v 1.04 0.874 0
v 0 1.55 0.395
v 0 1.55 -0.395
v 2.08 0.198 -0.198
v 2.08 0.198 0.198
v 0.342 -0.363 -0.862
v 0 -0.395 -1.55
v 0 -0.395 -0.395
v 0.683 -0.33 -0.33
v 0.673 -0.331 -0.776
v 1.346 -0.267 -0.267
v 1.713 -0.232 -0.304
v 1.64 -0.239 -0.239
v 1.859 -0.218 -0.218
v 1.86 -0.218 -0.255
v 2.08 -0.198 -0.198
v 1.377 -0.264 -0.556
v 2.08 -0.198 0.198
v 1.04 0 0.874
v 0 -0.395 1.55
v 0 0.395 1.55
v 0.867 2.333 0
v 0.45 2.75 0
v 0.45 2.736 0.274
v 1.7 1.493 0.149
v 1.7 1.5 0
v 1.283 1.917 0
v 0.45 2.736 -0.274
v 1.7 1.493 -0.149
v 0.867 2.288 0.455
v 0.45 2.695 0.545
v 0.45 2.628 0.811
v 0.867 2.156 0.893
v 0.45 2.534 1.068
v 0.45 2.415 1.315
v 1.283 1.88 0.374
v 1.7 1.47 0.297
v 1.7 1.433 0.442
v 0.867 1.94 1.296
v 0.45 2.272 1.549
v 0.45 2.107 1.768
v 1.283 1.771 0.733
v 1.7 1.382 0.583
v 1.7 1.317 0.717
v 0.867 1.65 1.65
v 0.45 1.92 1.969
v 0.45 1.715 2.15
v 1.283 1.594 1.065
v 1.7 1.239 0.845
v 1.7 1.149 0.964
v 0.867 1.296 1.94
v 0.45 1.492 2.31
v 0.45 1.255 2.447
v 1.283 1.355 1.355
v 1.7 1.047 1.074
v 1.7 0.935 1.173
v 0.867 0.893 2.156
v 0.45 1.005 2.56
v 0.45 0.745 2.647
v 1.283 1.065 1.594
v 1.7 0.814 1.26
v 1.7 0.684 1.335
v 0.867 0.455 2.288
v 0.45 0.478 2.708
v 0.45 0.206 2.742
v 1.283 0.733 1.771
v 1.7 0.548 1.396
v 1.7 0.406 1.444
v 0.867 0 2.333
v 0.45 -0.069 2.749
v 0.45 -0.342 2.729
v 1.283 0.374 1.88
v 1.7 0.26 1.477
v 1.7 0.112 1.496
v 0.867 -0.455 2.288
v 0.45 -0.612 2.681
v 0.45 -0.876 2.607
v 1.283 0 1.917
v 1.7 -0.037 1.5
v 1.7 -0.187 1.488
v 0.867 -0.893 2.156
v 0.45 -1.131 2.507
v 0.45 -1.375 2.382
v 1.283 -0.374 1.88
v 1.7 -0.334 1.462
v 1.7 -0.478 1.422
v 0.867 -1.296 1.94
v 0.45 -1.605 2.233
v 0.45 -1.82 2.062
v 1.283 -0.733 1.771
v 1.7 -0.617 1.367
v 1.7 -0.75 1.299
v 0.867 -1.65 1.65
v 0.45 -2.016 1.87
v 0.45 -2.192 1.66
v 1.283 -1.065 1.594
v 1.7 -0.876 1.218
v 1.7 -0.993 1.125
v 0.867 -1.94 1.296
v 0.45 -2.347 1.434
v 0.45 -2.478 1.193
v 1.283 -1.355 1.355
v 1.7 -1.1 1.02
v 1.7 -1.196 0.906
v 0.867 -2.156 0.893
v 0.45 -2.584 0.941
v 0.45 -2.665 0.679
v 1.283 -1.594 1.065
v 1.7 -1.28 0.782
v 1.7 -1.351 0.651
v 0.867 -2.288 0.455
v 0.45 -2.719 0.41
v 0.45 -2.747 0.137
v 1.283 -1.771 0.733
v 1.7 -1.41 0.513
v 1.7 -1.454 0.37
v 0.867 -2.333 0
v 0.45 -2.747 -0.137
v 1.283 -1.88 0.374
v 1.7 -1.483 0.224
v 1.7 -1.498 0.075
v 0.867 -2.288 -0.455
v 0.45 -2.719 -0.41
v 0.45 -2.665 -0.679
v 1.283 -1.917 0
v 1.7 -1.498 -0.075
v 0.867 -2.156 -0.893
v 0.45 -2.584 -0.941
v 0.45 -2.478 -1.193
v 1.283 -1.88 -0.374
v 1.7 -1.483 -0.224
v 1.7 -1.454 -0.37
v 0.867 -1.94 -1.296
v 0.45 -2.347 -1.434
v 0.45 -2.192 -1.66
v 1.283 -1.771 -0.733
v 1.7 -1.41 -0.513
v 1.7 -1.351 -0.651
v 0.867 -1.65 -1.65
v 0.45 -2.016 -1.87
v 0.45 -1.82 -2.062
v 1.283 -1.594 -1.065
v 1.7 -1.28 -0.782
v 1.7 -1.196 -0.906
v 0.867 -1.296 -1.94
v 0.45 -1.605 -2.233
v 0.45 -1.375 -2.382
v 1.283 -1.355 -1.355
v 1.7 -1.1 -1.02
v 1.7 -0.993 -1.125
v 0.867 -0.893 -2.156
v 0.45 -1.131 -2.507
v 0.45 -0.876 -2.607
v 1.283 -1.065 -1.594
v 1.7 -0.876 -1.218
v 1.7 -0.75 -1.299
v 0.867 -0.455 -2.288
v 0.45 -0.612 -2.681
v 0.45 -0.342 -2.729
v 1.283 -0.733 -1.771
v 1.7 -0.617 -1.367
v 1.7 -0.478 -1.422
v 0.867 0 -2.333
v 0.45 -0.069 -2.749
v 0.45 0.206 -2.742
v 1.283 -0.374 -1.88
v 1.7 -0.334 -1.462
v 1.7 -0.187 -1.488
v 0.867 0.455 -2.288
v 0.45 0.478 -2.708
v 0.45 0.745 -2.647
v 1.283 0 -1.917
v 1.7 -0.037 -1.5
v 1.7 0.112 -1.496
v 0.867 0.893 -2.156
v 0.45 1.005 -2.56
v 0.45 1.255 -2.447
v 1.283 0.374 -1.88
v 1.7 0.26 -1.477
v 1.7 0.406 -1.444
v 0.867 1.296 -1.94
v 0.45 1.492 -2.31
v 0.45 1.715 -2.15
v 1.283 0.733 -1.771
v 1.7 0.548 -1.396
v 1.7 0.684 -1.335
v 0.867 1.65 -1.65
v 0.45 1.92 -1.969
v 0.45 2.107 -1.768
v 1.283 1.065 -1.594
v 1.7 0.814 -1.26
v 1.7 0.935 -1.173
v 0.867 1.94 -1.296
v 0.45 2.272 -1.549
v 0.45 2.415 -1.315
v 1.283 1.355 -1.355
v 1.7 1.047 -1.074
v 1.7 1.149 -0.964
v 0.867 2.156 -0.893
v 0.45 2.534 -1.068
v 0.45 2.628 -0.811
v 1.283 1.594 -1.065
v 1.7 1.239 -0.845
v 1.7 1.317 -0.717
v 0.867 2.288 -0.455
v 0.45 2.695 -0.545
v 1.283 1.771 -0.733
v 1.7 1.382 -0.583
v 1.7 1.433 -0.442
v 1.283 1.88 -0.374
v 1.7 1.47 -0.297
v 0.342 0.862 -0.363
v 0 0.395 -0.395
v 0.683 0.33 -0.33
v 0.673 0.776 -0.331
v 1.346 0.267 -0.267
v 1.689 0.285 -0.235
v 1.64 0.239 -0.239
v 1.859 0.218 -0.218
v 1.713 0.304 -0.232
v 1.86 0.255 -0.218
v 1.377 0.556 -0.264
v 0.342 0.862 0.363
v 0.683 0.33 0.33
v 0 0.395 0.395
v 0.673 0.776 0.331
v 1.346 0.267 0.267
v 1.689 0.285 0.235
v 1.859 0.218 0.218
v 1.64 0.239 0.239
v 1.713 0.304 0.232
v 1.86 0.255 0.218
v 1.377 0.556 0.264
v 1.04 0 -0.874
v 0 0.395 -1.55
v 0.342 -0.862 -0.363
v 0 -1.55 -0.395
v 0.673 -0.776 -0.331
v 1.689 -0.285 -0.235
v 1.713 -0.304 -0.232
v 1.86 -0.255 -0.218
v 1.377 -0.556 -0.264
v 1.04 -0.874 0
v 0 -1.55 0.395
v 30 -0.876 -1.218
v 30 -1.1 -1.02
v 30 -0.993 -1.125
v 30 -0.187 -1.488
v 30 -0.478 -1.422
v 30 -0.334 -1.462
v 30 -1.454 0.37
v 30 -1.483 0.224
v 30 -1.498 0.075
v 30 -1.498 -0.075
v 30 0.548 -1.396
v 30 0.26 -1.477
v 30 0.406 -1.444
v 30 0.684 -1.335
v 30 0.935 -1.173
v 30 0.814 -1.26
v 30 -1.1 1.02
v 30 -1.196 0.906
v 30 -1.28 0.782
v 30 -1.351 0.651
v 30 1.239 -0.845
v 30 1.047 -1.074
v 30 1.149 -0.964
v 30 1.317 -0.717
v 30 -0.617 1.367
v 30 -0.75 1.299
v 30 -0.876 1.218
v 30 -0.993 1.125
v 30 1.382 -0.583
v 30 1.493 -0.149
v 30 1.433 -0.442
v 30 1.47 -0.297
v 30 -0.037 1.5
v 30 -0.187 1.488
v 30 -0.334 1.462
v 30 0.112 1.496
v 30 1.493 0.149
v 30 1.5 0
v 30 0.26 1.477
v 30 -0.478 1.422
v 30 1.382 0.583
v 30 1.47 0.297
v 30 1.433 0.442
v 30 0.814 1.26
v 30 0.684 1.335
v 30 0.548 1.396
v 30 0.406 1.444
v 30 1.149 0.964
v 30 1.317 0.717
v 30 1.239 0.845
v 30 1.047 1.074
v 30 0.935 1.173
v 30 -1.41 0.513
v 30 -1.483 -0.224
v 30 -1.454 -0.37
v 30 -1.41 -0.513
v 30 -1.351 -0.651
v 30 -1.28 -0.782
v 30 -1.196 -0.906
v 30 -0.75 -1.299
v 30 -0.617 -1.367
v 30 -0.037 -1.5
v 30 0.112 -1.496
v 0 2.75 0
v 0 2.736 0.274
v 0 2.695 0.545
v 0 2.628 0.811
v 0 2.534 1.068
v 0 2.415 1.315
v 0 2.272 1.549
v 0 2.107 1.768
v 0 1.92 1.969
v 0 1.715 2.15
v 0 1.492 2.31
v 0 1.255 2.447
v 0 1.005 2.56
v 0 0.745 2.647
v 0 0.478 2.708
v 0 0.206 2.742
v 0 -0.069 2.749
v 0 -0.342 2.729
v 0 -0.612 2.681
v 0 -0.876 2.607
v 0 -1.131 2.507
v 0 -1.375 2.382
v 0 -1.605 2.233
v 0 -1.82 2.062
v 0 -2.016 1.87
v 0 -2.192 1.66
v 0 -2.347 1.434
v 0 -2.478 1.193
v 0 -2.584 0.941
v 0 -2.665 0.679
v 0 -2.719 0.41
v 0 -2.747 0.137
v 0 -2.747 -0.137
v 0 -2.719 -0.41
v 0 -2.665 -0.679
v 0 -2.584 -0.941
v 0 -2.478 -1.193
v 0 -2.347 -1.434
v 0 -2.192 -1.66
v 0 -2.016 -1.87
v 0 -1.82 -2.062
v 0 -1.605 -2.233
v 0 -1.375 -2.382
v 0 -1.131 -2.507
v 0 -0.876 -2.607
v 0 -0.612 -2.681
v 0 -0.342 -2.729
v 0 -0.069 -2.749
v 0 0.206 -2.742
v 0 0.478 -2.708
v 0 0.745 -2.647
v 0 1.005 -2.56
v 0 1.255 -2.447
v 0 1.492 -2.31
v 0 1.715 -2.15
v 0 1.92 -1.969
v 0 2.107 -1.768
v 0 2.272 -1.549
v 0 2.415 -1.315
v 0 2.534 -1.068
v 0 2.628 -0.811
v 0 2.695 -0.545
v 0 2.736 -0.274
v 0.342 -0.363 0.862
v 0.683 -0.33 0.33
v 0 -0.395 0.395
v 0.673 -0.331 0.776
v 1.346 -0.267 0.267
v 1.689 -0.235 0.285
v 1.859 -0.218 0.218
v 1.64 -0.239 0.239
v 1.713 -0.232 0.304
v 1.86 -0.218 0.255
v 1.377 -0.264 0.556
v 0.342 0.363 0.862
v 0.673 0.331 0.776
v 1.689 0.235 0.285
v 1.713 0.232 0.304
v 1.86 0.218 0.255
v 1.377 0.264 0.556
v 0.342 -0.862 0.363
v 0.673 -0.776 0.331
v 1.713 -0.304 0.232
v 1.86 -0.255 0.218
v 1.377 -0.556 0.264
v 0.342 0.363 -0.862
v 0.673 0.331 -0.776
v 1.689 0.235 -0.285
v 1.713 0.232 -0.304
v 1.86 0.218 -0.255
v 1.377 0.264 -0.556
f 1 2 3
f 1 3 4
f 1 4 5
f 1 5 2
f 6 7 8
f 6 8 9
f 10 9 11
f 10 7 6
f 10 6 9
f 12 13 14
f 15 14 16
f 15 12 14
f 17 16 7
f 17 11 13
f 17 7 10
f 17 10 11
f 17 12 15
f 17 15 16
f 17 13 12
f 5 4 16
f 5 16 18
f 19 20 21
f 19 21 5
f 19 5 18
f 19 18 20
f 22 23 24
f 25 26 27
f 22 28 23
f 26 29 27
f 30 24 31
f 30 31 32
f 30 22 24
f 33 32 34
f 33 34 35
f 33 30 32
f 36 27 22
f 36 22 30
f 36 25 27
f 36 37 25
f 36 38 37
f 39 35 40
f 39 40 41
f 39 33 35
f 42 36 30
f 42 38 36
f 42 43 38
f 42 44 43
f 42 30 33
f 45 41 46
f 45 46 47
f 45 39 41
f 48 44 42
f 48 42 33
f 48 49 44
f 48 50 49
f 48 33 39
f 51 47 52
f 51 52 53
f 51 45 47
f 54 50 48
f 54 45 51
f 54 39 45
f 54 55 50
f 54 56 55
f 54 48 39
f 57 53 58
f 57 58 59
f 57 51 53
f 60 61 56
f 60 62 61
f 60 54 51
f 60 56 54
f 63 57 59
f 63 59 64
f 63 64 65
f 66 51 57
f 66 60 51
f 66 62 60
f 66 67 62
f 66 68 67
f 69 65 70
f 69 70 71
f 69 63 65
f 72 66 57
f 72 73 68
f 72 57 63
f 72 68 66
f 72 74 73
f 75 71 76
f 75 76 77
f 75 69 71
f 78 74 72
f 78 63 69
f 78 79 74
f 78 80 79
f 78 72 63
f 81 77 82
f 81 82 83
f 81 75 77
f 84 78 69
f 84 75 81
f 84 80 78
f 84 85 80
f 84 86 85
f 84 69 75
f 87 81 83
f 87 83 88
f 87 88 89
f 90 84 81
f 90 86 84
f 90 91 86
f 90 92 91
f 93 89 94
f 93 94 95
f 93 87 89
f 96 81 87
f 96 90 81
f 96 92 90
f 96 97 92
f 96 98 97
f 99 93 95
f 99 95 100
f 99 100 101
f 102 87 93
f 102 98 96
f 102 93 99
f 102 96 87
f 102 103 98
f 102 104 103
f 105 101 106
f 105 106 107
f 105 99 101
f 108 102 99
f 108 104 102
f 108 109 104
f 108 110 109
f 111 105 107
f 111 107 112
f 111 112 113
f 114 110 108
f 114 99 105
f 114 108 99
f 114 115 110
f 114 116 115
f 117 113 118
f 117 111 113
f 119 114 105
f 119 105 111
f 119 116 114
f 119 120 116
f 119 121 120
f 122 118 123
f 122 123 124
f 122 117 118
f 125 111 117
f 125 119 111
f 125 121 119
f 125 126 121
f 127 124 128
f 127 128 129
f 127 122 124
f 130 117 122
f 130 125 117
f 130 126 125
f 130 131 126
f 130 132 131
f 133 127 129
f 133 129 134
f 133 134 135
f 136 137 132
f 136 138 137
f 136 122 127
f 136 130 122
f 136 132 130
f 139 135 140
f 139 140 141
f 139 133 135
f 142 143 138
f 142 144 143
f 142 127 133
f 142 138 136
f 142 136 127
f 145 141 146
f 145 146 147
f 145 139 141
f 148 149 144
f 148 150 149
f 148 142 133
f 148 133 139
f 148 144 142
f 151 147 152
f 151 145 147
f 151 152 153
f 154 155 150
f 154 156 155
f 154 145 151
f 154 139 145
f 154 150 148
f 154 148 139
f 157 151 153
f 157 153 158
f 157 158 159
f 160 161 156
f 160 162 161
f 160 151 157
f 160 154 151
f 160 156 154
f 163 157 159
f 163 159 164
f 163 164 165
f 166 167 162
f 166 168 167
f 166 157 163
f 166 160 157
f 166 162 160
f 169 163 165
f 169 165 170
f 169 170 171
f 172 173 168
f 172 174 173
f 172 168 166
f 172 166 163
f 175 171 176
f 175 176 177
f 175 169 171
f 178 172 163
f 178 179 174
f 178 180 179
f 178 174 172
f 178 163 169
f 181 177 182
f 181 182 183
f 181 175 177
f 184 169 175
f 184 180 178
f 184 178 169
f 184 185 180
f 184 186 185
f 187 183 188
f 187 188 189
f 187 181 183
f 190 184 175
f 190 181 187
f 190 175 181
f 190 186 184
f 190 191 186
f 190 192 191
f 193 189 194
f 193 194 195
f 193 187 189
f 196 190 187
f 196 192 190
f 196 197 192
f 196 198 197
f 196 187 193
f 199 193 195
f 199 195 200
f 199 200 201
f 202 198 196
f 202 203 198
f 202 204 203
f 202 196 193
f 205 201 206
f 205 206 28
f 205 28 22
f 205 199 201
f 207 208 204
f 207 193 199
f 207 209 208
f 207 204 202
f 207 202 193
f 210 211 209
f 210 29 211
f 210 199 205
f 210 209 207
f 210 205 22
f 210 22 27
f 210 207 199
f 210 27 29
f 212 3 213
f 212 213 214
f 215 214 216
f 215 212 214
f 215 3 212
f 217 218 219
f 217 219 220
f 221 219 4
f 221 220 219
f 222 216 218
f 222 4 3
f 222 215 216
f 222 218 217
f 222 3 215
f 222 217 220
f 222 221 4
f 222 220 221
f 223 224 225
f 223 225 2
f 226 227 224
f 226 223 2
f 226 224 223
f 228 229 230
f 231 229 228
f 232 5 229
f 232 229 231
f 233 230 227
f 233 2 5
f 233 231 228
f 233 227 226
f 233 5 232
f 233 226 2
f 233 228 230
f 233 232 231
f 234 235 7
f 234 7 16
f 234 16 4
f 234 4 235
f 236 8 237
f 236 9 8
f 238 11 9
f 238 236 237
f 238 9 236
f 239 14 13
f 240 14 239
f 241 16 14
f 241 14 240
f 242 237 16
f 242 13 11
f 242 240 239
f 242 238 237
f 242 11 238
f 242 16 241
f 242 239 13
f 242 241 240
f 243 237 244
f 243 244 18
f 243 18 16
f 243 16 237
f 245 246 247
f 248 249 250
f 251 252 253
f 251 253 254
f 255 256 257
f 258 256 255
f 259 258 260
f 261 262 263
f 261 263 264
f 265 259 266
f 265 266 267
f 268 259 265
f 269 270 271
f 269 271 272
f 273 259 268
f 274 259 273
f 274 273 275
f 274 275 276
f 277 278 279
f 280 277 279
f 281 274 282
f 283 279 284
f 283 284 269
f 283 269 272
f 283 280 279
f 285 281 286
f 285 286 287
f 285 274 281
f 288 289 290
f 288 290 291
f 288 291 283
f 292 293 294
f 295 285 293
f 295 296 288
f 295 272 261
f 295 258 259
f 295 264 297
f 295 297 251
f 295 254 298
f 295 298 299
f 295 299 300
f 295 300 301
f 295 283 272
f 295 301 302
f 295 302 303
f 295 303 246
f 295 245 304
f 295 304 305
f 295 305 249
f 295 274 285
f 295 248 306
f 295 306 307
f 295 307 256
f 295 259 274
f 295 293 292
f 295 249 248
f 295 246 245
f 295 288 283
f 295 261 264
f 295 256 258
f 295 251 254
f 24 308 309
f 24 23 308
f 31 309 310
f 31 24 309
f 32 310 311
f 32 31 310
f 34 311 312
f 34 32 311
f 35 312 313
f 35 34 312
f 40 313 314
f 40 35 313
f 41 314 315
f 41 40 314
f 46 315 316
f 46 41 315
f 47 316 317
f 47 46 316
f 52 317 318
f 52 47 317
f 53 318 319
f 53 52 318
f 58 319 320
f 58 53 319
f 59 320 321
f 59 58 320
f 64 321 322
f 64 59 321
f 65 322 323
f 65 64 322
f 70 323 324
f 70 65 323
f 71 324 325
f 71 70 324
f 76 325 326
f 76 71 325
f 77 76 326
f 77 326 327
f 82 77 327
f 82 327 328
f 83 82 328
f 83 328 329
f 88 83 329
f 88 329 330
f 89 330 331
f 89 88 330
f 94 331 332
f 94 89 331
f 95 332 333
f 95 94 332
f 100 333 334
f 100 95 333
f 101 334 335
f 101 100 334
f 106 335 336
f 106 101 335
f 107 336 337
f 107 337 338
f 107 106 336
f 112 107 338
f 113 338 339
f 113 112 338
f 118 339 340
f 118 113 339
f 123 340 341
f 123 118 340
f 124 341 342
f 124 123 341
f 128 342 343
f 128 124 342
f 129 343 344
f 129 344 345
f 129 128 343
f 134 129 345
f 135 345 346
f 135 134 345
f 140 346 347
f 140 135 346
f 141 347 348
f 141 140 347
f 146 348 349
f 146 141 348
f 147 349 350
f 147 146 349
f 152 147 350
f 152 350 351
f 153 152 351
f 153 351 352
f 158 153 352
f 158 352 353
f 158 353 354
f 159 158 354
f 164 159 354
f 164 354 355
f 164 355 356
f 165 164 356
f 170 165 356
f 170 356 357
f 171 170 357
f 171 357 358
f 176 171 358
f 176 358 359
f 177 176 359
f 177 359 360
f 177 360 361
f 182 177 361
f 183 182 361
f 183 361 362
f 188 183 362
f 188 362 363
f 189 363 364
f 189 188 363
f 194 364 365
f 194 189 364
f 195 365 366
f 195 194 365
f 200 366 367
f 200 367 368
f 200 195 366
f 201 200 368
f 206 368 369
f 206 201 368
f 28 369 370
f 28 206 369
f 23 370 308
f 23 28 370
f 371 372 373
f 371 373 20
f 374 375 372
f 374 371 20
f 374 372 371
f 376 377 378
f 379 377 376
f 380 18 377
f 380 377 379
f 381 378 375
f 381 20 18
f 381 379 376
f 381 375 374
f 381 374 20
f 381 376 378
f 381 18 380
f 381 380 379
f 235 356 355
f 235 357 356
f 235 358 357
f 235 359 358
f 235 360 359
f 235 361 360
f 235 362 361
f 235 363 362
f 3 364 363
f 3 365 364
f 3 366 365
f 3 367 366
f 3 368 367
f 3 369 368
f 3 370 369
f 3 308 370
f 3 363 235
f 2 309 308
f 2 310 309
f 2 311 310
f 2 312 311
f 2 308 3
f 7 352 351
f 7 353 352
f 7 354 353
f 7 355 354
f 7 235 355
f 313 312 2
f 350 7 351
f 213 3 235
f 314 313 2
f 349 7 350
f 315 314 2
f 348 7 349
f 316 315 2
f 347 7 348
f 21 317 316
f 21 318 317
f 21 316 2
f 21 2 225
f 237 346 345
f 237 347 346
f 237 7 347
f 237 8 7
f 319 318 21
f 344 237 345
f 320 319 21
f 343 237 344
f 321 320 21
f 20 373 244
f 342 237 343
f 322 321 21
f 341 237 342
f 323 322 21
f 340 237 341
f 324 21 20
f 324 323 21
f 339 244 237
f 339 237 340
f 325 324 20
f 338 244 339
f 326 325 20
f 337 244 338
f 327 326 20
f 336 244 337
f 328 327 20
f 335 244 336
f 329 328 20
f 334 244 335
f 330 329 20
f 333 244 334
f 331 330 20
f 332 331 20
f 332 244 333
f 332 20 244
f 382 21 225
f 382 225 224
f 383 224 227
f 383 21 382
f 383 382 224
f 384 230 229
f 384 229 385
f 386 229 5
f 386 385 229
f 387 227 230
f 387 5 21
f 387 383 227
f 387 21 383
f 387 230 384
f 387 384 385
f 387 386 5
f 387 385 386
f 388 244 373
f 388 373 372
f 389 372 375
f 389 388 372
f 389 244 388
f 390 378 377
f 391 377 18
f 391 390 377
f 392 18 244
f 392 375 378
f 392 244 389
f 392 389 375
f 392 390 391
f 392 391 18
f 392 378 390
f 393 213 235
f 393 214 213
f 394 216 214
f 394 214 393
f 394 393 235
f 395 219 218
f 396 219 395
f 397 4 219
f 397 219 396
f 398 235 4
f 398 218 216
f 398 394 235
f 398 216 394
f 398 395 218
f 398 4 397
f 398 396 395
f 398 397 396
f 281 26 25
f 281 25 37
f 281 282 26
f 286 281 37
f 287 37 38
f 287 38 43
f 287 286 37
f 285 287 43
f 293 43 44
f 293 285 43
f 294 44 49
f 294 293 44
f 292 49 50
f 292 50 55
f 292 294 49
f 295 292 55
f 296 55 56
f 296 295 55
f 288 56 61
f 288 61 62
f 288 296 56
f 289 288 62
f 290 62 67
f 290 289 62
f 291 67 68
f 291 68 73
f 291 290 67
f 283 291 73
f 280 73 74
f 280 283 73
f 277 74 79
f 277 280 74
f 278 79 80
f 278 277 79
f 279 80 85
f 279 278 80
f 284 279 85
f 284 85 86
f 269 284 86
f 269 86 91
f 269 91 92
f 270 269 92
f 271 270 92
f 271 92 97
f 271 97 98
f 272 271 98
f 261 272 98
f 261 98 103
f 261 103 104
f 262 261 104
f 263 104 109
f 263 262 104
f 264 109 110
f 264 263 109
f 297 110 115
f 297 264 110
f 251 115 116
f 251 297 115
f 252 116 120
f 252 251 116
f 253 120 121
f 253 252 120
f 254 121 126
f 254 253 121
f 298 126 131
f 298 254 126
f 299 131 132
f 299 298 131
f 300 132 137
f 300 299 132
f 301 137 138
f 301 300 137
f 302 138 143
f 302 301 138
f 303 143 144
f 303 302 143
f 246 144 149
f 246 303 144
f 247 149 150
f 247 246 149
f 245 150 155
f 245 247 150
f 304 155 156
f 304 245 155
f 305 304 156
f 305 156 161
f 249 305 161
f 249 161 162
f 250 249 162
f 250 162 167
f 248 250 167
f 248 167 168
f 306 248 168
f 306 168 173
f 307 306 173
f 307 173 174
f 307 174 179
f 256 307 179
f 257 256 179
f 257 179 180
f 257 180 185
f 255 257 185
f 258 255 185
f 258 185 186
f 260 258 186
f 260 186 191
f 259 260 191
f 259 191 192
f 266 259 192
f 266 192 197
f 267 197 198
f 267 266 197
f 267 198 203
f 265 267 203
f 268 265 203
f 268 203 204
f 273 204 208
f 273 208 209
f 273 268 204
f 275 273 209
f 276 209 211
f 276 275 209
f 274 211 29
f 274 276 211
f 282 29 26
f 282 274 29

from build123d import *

# Parameters (mm, degrees)
SKETCH3_W         = 0.79
SKETCH3_H         = 3.1
SKETCH4_W         = 0.395
SKETCH4_H         = 0.395
CIRPATTERN1_COUNT = 2
CIRPATTERN1_ANGLE = 90


with BuildPart() as part:
    # BodySke → Base-Revolve (revolve)
    with BuildSketch(Plane.XY):
        Polygon((0, 0), (0, 2.75), (0.45, 2.75), (1.7, 1.5), (30, 1.5), (30, 0), align=None)
    revolve(axis=Axis((-6.35, 0, 0), (1, 0, 0)))

    # Sketch3 → Cross section 0
    with BuildSketch(Plane.ZY):
        Rectangle(SKETCH3_W, SKETCH3_H)
    # Sketch4 → Cross section 1
    with BuildSketch(Plane.ZY.offset(-2.08)):
        Rectangle(SKETCH4_W, SKETCH4_H)
    cross = loft(mode=Mode.SUBTRACT)

    # CirPattern1: Cross ×2 about axis
    cirpattern1_axis = Axis((0, 0, 0), (1, 0, 0))
    for i in range(1, CIRPATTERN1_COUNT):
        add(cross.rotate(cirpattern1_axis, i * CIRPATTERN1_ANGLE / (CIRPATTERN1_COUNT - 1)), mode=Mode.SUBTRACT)


solid = part.part
